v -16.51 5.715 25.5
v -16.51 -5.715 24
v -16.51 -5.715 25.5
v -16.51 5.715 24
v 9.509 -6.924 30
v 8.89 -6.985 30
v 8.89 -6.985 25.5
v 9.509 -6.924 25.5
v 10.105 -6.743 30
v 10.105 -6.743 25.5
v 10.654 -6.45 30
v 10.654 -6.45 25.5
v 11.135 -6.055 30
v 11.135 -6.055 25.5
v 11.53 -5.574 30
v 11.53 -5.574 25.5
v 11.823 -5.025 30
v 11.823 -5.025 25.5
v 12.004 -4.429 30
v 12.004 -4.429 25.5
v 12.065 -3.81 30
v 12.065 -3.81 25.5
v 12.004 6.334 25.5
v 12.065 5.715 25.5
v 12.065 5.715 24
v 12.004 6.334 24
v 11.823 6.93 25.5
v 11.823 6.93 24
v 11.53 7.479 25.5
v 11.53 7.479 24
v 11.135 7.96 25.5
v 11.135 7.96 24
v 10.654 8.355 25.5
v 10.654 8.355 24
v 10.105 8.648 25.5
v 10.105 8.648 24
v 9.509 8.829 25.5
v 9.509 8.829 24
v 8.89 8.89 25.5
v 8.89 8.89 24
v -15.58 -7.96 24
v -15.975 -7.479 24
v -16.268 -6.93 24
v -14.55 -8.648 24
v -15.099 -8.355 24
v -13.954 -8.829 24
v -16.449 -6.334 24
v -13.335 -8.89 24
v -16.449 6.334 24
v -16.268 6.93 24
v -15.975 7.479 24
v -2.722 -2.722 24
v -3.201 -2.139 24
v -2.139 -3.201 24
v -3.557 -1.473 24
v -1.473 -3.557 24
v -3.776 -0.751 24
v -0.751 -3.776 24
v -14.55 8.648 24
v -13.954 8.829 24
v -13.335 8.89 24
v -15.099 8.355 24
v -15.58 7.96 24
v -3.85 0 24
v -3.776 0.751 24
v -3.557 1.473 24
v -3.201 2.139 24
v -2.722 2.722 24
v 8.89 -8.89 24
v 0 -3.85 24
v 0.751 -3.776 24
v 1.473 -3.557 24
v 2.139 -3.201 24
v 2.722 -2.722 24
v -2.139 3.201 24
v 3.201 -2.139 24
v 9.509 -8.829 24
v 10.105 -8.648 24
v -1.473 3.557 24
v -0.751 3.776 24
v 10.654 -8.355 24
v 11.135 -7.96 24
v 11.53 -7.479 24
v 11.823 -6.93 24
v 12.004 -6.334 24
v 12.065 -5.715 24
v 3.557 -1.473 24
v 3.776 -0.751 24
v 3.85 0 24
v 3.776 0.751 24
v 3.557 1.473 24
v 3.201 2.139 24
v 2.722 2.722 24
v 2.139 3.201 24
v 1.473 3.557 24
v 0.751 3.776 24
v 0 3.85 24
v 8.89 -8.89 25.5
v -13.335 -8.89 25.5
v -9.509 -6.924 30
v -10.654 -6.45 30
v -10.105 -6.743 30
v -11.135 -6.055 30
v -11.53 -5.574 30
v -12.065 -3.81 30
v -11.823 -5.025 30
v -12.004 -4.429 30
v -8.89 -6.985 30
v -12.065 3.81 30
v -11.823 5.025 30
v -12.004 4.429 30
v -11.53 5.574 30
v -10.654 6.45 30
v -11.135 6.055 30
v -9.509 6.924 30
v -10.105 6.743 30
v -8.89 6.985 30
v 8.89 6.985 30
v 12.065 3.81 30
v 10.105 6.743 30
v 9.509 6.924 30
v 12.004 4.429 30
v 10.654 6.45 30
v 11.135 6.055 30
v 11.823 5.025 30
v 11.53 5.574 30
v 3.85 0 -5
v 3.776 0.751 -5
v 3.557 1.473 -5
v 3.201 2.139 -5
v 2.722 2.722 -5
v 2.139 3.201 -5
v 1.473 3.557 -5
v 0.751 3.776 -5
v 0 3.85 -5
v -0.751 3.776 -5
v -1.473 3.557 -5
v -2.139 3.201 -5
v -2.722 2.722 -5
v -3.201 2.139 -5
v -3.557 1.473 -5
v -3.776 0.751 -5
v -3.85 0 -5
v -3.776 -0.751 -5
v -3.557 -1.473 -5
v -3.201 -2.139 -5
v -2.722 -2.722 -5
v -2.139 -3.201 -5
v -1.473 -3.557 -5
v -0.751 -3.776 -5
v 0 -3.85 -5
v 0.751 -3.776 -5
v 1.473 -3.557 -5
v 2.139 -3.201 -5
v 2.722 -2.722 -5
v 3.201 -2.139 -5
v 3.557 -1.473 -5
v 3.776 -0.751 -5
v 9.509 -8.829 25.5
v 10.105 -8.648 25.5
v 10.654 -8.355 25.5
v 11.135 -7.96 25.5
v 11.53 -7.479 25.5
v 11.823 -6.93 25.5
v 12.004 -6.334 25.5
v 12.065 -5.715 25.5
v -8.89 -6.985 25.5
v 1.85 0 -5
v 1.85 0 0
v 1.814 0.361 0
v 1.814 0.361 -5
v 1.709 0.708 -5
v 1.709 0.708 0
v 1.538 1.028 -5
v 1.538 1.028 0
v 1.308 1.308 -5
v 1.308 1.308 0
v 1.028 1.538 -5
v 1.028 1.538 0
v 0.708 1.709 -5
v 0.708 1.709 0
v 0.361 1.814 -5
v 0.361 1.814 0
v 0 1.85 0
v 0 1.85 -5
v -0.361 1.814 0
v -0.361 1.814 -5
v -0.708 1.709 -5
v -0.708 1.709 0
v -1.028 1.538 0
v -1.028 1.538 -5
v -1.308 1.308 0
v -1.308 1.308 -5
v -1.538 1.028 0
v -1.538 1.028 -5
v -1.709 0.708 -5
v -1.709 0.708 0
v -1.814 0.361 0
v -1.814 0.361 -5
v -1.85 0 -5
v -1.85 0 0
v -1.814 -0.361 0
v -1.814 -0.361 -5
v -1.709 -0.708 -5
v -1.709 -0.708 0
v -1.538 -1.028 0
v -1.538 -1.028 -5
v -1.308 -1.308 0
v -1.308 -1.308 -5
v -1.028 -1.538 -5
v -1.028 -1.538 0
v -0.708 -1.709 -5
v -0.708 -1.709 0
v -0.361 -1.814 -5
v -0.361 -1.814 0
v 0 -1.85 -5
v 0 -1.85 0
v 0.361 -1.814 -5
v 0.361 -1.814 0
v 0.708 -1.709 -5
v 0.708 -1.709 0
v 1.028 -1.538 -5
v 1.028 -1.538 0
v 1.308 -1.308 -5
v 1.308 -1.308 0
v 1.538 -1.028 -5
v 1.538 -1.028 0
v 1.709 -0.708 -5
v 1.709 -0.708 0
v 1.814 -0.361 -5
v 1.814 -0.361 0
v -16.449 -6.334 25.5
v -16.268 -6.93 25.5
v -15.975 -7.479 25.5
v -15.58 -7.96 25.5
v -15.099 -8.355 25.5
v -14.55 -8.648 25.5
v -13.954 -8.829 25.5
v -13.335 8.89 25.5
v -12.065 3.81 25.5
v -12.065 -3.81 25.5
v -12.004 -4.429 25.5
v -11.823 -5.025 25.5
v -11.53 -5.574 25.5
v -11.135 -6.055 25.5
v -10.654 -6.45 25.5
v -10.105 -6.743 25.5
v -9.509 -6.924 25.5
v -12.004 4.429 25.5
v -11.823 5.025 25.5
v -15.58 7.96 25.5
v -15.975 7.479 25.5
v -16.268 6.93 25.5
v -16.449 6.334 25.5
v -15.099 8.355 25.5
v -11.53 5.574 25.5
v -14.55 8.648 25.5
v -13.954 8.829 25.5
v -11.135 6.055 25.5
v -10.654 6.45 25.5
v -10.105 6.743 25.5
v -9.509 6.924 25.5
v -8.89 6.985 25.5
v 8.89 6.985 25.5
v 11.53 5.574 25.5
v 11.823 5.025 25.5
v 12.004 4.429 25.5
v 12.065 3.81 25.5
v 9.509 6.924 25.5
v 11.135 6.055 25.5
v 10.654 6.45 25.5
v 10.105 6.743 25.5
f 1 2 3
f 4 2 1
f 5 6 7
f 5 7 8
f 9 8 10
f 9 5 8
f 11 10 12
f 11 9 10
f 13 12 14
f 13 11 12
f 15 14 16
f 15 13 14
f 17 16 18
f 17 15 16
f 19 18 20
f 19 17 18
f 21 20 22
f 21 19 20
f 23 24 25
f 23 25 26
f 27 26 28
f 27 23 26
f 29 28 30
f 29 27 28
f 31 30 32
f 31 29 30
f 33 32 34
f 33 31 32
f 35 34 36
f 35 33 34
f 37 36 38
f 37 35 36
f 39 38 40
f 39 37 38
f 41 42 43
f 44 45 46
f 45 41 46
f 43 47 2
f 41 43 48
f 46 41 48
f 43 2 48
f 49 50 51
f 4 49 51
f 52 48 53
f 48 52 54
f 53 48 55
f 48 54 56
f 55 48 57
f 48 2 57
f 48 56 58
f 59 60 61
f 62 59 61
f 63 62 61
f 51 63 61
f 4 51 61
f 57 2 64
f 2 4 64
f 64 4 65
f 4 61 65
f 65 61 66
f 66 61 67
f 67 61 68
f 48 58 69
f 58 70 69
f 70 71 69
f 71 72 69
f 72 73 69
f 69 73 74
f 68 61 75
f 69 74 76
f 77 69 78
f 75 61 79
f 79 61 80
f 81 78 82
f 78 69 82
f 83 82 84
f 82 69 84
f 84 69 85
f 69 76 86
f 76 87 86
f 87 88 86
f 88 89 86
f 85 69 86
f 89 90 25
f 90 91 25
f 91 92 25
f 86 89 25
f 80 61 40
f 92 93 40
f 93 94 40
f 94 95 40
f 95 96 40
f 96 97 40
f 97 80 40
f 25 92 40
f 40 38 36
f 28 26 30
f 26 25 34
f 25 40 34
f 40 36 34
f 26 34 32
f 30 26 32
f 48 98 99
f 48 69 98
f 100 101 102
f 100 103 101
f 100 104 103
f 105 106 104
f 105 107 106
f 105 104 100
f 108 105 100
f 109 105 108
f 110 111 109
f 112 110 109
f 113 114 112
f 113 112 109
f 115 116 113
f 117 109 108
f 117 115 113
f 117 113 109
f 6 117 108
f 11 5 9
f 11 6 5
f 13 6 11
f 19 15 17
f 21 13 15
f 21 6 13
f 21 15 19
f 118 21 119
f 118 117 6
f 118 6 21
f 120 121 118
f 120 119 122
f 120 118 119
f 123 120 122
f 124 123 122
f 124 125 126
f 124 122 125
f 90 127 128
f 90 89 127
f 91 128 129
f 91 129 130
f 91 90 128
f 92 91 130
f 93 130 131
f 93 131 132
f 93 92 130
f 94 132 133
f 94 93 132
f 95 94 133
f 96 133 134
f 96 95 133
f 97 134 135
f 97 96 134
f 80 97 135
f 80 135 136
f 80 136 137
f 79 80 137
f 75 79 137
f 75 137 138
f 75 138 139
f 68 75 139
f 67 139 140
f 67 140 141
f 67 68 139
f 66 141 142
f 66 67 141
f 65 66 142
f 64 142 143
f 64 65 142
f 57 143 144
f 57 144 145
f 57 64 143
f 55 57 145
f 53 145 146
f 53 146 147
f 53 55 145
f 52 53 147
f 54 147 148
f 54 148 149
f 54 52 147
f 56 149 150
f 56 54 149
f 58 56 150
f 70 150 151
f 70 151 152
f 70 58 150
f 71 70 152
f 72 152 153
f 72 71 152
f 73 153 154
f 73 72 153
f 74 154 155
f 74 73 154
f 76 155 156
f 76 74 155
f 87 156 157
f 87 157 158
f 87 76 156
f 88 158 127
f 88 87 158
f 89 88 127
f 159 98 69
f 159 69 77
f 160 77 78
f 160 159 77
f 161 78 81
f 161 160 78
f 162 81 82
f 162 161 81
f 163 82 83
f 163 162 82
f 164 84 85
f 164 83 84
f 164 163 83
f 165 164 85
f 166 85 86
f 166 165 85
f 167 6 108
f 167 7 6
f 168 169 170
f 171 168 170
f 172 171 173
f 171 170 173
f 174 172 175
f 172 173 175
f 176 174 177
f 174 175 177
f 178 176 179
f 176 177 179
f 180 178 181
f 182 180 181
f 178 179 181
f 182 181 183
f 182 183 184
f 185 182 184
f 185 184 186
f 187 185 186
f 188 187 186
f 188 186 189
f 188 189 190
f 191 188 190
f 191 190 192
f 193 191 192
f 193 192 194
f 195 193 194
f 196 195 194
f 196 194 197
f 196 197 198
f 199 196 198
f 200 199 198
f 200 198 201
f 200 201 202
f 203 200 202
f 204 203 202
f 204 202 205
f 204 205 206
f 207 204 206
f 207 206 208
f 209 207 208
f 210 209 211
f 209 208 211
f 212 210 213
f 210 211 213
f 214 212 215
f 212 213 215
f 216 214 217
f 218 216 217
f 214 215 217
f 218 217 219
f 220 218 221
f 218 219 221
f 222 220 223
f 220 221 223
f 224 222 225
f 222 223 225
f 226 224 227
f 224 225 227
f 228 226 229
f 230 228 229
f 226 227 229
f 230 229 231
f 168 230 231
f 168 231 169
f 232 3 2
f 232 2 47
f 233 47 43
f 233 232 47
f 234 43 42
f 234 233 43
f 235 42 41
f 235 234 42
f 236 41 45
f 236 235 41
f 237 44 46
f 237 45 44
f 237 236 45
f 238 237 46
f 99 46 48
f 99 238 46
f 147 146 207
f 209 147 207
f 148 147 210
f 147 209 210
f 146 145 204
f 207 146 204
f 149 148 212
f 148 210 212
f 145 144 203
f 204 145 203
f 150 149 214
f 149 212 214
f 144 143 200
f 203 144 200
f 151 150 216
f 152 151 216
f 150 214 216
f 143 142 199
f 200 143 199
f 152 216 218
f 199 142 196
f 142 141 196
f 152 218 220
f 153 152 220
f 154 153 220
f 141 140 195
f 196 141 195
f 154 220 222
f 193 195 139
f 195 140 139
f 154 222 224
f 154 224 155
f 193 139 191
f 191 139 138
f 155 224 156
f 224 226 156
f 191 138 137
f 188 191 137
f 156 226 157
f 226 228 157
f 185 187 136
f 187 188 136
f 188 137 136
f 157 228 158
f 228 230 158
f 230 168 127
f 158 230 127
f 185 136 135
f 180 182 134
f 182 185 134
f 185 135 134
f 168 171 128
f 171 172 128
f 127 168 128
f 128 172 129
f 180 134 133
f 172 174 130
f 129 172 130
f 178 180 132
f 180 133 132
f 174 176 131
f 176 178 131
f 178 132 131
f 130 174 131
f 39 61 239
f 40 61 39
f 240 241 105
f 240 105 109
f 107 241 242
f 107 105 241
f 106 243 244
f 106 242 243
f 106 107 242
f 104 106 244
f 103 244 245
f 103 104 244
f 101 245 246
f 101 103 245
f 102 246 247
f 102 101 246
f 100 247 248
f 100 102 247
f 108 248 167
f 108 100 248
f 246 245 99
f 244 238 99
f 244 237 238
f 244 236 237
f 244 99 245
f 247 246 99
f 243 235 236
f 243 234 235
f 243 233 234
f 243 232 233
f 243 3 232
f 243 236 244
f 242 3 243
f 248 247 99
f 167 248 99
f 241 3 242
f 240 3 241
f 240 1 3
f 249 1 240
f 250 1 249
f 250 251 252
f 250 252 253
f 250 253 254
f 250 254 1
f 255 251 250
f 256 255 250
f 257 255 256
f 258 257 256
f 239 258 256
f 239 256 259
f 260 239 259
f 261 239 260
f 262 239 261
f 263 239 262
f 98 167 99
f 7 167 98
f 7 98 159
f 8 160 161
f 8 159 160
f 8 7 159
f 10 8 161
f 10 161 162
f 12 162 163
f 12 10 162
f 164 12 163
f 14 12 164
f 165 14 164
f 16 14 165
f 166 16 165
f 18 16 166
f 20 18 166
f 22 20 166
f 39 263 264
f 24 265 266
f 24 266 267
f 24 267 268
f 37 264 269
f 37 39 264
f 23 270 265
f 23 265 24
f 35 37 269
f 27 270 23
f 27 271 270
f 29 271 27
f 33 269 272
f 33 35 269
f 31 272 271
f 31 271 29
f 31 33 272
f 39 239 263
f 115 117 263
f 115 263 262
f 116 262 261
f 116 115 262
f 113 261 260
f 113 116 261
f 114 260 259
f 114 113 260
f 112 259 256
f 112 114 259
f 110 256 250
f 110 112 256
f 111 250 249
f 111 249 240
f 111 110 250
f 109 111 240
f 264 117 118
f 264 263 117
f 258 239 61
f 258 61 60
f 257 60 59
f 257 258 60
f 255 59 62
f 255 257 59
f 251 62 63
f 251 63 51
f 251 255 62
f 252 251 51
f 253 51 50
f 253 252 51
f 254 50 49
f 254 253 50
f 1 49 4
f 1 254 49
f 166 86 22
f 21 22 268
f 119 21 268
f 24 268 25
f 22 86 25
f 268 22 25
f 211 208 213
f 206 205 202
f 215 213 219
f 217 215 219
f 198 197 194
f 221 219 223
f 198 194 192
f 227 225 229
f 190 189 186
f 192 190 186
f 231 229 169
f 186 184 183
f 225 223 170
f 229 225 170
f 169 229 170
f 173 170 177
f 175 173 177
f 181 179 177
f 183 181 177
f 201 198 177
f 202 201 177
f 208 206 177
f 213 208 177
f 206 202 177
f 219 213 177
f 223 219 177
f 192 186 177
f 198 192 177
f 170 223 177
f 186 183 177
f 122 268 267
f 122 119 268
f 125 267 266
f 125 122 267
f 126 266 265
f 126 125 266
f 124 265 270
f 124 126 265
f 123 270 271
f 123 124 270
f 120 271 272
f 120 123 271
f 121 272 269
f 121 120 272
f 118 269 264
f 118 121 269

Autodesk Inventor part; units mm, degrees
ref_plane "YZ Plane" through (0, 0, 0) normal (1, 0, 0) x (0, 1, 0)
ref_plane "XZ Plane" through (0, 0, 0) normal (0, 1, 0) x (-1, 0, 0)
ref_plane "XY Plane" through (0, 0, 0) normal (0, 0, 1) x (1, 0, 0)
sketch "Sketch1" plane through (0, 0, 0) normal (0, 0, 1) x (1, 0, 0)
  circle A0 centre (0, 0) radius 1.75 projected
  circle A1 centre (0, 0) radius 1.85
  circle A2 centre (0, 0) radius 3.85
  point P0 (0, 0)
  dimension "d0" = 0.1
  dimension "d1" = 2
extrude "Extrusion1" add sketch "Sketch1" against normal blind 5 contours A2
sketch "Sketch2" plane through (0, 0, 0) normal (0, 0, 1) x (1, 0, 0)
  point P0 (0, 0)
sketch "Sketch3" plane through (0, 0, 0) normal (0, 0, 1) x (1, 0, 0)
  circle A0 centre (0, 0) radius 3.85
extrude "Extrusion2" add sketch "Sketch3" along normal blind 24
sketch "Sketch4" plane through (0, 0, 24) normal (0, 0, 1) x (1, 0, 0)
  line L0 (12.065, -6.985) -> (-12.065, -6.985)
  line L1 (-12.065, -6.985) -> (-12.065, 6.985)
  line L2 (-12.065, 6.985) -> (12.065, 6.985)
  line L3 (12.065, 6.985) -> (12.065, -6.985)
  circle A0 centre (0, 0) radius 1.85 projected
  line L4 (12.065, -6.985) -> (-12.065, 6.985) construction
  line L5 (-12.065, -6.985) -> (12.065, 6.985) construction
  line L6 (12.065, 12.065) -> (-12.065, 12.065) construction
  line L7 (-12.065, 12.065) -> (-12.065, 26.035) construction
  line L8 (-12.065, 26.035) -> (12.065, 26.035) construction
  line L9 (12.065, 26.035) -> (12.065, 12.065) construction
  line L10 (12.065, 12.065) -> (-12.065, 26.035) construction
  line L11 (-12.065, 12.065) -> (12.065, 26.035) construction
  line L12 (12.065, -8.89) -> (-16.51, -8.89)
  line L13 (-16.51, -8.89) -> (-16.51, 8.89)
  line L14 (-16.51, 8.89) -> (12.065, 8.89)
  line L15 (16.51, -8.89) -> (-16.51, 8.89) construction
  line L16 (-16.51, -8.89) -> (12.065, 6.4965) construction
  line L17 (12.065, -8.89) -> (12.065, 8.89)
  point P0 (0, 0)
  point P1 (0, 19.05)
  dimension "d6" = 24.13
  dimension "d7" = 13.97
  dimension "d10" = 19.05
  dimension "d16" = 17.78
extrude "Extrusion3" add sketch "Sketch4" along normal blind 1.5 contours L17 L12 L13 L14 L2 L1 L0 | L0 L1 L2 L3 | A0
extrude "Extrusion4" add sketch "Sketch4" along normal blind 6 contours L0 L1 L2 L3 | A0
fillet "Fillet1" radius 3.175 8 edges at (-12.065, 6.985, 27.75) (12.065, 6.985, 27.75) (12.065, -6.985, 27.75) (-12.065, -6.985, 27.75) (-16.51, -8.89, 24.75) (12.065, 8.89, 24.75) (-16.51, 8.89, 24.75) (12.065, -8.89, 24.75)
properties part number "Button Cover"
